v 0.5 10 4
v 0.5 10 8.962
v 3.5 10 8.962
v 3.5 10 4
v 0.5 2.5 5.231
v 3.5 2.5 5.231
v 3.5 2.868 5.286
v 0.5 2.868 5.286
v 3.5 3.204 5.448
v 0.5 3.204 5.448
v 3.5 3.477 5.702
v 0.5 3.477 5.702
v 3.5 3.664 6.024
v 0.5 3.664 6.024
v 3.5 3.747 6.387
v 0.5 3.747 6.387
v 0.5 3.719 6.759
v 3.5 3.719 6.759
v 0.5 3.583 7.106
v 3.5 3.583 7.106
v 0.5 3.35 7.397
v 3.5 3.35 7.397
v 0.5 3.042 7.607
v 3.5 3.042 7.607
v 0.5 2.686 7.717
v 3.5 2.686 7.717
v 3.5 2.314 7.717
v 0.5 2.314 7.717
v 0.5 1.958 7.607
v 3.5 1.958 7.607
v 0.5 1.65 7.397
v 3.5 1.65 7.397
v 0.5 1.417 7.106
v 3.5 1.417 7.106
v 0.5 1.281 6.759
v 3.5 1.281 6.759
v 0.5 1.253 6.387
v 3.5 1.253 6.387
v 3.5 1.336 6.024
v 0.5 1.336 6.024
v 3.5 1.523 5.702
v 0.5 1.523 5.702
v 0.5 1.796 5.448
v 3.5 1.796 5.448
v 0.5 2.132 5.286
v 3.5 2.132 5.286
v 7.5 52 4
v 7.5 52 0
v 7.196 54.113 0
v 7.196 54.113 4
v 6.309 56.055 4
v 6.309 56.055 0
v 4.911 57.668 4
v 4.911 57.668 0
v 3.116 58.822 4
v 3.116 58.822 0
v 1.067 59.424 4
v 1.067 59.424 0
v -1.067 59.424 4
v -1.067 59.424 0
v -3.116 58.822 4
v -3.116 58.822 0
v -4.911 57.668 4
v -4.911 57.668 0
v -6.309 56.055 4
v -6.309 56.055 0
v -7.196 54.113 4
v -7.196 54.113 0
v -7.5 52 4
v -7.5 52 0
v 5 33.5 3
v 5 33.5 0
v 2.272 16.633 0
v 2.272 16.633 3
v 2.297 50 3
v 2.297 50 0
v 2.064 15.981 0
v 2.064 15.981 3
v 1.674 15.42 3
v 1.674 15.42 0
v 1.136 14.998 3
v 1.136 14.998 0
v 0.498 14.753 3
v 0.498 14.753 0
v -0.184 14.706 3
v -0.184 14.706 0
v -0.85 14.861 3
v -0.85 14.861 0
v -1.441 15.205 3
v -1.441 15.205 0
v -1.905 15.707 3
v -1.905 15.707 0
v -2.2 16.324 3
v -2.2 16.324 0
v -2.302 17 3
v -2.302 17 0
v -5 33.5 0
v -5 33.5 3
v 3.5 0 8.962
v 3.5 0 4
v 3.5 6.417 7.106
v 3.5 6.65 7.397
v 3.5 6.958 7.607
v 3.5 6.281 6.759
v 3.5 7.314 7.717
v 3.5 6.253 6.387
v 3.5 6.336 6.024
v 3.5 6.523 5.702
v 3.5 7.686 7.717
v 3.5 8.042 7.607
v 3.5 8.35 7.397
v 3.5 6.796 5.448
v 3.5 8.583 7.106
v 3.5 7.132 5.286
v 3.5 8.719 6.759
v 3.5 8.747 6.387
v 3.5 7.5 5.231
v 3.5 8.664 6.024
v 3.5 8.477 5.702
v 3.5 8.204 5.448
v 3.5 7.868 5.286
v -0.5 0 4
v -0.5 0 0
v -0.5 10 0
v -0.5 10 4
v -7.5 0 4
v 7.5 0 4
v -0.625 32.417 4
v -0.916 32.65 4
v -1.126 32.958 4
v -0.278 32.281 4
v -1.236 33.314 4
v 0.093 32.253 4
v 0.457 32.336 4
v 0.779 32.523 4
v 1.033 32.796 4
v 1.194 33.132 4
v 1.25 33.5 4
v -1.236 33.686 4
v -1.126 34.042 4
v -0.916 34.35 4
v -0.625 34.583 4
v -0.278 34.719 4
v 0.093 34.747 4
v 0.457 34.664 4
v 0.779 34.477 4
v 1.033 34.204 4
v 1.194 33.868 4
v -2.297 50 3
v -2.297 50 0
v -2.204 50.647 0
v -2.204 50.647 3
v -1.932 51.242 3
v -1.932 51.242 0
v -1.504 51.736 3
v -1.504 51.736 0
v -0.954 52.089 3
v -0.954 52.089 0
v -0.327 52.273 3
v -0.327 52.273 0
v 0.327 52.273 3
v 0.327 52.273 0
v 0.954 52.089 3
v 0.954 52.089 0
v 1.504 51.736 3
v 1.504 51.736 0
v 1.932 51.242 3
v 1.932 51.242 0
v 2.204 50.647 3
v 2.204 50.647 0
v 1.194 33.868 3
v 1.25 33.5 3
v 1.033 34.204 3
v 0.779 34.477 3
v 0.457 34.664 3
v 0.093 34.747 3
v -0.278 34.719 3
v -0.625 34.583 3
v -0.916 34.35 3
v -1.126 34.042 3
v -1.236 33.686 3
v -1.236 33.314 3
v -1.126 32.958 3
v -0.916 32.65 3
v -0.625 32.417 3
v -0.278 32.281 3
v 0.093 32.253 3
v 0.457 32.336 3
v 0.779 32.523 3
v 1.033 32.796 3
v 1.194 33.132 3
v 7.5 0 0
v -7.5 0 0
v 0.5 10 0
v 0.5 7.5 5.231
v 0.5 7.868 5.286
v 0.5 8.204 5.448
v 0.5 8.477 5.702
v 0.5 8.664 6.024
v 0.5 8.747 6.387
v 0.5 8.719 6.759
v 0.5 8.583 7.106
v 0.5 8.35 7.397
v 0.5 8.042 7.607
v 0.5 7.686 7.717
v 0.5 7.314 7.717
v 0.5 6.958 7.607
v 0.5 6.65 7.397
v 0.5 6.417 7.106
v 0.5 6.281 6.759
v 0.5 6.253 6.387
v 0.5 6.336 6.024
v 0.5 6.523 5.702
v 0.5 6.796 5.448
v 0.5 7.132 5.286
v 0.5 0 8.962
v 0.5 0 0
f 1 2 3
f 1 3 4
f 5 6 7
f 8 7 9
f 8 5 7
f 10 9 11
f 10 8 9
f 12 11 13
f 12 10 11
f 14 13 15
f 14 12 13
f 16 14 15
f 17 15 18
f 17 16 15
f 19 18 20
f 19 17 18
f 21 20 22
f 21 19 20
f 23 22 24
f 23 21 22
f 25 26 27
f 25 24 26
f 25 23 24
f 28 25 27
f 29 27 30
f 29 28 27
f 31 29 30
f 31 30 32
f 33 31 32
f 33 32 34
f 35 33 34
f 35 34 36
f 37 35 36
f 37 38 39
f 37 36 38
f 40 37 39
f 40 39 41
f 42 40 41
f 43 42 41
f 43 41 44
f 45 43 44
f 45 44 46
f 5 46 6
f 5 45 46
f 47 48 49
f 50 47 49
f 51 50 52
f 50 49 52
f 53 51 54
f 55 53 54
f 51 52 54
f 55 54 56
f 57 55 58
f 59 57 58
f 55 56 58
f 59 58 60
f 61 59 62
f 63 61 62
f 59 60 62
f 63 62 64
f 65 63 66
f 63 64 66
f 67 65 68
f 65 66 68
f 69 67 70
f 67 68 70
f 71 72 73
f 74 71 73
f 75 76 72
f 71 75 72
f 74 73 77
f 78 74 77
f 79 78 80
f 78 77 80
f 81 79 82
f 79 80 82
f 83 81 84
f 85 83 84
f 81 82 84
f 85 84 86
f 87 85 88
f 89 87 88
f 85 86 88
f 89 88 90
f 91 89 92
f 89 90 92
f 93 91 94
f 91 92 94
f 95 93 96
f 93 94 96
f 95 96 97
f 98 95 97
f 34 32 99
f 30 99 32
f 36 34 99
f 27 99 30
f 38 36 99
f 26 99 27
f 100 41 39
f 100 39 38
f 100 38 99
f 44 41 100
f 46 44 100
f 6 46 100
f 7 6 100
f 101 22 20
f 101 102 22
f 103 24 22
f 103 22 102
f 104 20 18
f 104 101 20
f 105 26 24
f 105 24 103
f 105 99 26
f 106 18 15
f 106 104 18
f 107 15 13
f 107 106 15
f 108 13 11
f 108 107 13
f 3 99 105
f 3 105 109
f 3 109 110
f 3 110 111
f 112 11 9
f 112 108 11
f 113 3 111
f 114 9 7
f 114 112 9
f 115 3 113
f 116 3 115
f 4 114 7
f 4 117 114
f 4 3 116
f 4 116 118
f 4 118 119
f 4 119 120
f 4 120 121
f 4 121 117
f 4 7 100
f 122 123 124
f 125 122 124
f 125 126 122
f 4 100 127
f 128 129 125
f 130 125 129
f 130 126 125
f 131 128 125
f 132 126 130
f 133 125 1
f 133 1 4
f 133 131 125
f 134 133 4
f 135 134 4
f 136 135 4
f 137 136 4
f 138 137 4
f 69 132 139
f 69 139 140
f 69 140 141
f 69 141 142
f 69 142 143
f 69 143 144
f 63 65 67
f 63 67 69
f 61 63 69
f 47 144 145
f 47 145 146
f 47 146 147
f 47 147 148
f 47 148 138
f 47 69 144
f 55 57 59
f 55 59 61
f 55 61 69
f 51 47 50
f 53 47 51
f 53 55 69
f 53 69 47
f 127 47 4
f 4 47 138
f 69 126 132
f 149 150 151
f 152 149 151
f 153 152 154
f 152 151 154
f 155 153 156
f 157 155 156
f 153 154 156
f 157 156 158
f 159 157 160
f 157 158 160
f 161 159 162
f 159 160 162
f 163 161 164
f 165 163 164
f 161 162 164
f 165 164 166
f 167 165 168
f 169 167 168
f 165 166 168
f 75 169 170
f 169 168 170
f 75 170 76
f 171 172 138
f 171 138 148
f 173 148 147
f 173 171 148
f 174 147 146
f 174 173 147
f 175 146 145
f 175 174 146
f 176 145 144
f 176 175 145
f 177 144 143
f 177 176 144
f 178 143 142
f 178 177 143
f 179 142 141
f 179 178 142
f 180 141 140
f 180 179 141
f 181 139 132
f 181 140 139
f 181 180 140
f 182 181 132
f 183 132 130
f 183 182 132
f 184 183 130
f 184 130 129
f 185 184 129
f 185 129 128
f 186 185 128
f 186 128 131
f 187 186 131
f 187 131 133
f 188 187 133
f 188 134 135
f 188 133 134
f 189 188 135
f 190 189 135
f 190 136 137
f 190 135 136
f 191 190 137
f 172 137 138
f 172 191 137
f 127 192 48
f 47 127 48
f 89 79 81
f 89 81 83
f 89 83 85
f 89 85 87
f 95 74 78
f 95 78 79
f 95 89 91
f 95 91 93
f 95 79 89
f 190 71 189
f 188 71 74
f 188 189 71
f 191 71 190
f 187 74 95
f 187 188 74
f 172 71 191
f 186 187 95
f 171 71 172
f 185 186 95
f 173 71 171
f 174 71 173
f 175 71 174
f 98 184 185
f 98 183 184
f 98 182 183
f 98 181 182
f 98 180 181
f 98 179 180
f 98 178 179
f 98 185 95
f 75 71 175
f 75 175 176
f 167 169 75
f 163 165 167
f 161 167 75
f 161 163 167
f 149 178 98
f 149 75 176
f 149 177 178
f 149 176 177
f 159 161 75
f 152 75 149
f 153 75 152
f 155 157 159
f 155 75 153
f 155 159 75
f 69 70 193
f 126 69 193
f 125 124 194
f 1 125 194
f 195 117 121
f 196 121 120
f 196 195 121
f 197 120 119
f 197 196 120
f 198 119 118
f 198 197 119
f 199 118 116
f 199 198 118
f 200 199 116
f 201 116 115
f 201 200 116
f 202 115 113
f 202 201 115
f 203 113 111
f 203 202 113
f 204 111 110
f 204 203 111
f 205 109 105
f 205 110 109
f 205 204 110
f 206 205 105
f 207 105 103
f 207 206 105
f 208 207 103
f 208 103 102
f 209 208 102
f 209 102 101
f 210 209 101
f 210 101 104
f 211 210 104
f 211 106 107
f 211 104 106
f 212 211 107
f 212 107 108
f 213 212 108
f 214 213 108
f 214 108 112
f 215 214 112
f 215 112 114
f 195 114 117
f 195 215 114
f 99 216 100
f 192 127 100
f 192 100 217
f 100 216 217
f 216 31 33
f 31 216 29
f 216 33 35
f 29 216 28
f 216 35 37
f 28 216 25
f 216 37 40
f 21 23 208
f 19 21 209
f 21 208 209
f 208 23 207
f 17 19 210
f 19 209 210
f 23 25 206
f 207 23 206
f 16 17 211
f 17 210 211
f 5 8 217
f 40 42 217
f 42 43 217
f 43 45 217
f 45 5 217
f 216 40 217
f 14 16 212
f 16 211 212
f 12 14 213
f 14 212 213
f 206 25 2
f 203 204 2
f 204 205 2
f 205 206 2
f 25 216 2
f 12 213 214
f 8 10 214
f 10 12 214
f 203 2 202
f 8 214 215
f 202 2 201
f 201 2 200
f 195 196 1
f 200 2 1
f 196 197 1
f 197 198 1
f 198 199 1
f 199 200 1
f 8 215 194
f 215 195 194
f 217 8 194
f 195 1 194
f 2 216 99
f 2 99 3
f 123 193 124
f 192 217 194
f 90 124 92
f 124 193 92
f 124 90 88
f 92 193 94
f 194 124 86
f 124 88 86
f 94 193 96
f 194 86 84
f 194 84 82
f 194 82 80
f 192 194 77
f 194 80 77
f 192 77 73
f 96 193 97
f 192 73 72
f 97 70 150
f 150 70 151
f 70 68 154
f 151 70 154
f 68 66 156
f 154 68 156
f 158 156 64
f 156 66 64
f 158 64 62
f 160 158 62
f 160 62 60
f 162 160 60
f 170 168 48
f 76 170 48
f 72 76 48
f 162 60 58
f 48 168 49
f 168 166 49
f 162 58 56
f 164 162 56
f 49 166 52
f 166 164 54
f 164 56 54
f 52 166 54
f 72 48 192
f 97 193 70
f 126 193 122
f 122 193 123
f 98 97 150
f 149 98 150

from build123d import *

# Parameters (mm, degrees)
EXTRUDE_1_DEPTH     = 4
CUT_EXTRUDE_1_DEPTH = 3
SKETCH_5_R          = 1.25
CUT_EXTRUDE_2_DEPTH = 12.4
SKETCH_6_W          = 1
SKETCH_6_H          = 10
CUT_EXTRUDE_3_DEPTH = 16.3
SKETCH_9_W          = 5
SKETCH_9_H          = 10
EXTRUDE_4_DEPTH     = 3
SKETCH_10_R         = 1.25
CUT_EXTRUDE_4_DEPTH = 5.1


with BuildPart() as part:
    # 草圖1 → 填料-伸長1 (new body)
    with BuildSketch(Plane.XY):
        with BuildLine():
            Line((7.5, 0), (7.5, 52))
            ThreePointArc((7.5, 52), (0, 59.5), (-7.5, 52))
            Line((-7.5, 52), (-7.5, 0))
            Line((-7.5, 0), (7.5, 0))
        make_face()
    extrude(amount=EXTRUDE_1_DEPTH)

    # 草圖3 → 除料-伸長1 (cut)
    with BuildSketch(Plane.XY):
        with BuildLine():
            ThreePointArc((-2.296635758, 50), (0, 52.296635758), (2.296635758, 50))
            Line((2.296635758, 50), (5, 33.5))
            Line((5, 33.5), (2.272331993, 16.632537074))
            ThreePointArc((2.272331993, 16.632537074), (-0.184323371, 14.705540024), (-2.301851795, 17))
            Line((-2.301851795, 17), (-5, 33.5))
            Line((-5, 33.5), (-2.296635758, 50))
        make_face()
    extrude(amount=CUT_EXTRUDE_1_DEPTH, mode=Mode.SUBTRACT)

    # 草圖5 → 除料-伸長2 (cut)
    with BuildSketch(Plane.XY):
        with Locations((0, 33.5)):
            Circle(SKETCH_5_R)
    extrude(amount=CUT_EXTRUDE_2_DEPTH, mode=Mode.SUBTRACT)

    # 草圖6 → 除料-伸長3 (cut)
    with BuildSketch(Plane.XY):
        with Locations((0, 5)):
            Rectangle(SKETCH_6_W, SKETCH_6_H)
    extrude(amount=CUT_EXTRUDE_3_DEPTH, mode=Mode.SUBTRACT)

    # 草圖9 → 填料-伸長4 (add)
    with BuildSketch(Plane(origin=(0.5, 0, 0), x_dir=(0, 0, -1), z_dir=(1, 0, 0))):
        with Locations((-6.46178466, 5)):
            Rectangle(SKETCH_9_W, SKETCH_9_H)
    extrude(amount=EXTRUDE_4_DEPTH)

    # 草圖10 → 除料-伸長4 (cut)
    with BuildSketch(Plane(origin=(0.5, 0, 0), x_dir=(0, 0, -1), z_dir=(1, 0, 0))):
        with Locations((-6.48089233, 7.5)):
            Circle(SKETCH_10_R)
        with Locations((-6.48089233, 2.5)):
            Circle(SKETCH_10_R)
    extrude(amount=CUT_EXTRUDE_4_DEPTH, mode=Mode.SUBTRACT)


solid = part.part
